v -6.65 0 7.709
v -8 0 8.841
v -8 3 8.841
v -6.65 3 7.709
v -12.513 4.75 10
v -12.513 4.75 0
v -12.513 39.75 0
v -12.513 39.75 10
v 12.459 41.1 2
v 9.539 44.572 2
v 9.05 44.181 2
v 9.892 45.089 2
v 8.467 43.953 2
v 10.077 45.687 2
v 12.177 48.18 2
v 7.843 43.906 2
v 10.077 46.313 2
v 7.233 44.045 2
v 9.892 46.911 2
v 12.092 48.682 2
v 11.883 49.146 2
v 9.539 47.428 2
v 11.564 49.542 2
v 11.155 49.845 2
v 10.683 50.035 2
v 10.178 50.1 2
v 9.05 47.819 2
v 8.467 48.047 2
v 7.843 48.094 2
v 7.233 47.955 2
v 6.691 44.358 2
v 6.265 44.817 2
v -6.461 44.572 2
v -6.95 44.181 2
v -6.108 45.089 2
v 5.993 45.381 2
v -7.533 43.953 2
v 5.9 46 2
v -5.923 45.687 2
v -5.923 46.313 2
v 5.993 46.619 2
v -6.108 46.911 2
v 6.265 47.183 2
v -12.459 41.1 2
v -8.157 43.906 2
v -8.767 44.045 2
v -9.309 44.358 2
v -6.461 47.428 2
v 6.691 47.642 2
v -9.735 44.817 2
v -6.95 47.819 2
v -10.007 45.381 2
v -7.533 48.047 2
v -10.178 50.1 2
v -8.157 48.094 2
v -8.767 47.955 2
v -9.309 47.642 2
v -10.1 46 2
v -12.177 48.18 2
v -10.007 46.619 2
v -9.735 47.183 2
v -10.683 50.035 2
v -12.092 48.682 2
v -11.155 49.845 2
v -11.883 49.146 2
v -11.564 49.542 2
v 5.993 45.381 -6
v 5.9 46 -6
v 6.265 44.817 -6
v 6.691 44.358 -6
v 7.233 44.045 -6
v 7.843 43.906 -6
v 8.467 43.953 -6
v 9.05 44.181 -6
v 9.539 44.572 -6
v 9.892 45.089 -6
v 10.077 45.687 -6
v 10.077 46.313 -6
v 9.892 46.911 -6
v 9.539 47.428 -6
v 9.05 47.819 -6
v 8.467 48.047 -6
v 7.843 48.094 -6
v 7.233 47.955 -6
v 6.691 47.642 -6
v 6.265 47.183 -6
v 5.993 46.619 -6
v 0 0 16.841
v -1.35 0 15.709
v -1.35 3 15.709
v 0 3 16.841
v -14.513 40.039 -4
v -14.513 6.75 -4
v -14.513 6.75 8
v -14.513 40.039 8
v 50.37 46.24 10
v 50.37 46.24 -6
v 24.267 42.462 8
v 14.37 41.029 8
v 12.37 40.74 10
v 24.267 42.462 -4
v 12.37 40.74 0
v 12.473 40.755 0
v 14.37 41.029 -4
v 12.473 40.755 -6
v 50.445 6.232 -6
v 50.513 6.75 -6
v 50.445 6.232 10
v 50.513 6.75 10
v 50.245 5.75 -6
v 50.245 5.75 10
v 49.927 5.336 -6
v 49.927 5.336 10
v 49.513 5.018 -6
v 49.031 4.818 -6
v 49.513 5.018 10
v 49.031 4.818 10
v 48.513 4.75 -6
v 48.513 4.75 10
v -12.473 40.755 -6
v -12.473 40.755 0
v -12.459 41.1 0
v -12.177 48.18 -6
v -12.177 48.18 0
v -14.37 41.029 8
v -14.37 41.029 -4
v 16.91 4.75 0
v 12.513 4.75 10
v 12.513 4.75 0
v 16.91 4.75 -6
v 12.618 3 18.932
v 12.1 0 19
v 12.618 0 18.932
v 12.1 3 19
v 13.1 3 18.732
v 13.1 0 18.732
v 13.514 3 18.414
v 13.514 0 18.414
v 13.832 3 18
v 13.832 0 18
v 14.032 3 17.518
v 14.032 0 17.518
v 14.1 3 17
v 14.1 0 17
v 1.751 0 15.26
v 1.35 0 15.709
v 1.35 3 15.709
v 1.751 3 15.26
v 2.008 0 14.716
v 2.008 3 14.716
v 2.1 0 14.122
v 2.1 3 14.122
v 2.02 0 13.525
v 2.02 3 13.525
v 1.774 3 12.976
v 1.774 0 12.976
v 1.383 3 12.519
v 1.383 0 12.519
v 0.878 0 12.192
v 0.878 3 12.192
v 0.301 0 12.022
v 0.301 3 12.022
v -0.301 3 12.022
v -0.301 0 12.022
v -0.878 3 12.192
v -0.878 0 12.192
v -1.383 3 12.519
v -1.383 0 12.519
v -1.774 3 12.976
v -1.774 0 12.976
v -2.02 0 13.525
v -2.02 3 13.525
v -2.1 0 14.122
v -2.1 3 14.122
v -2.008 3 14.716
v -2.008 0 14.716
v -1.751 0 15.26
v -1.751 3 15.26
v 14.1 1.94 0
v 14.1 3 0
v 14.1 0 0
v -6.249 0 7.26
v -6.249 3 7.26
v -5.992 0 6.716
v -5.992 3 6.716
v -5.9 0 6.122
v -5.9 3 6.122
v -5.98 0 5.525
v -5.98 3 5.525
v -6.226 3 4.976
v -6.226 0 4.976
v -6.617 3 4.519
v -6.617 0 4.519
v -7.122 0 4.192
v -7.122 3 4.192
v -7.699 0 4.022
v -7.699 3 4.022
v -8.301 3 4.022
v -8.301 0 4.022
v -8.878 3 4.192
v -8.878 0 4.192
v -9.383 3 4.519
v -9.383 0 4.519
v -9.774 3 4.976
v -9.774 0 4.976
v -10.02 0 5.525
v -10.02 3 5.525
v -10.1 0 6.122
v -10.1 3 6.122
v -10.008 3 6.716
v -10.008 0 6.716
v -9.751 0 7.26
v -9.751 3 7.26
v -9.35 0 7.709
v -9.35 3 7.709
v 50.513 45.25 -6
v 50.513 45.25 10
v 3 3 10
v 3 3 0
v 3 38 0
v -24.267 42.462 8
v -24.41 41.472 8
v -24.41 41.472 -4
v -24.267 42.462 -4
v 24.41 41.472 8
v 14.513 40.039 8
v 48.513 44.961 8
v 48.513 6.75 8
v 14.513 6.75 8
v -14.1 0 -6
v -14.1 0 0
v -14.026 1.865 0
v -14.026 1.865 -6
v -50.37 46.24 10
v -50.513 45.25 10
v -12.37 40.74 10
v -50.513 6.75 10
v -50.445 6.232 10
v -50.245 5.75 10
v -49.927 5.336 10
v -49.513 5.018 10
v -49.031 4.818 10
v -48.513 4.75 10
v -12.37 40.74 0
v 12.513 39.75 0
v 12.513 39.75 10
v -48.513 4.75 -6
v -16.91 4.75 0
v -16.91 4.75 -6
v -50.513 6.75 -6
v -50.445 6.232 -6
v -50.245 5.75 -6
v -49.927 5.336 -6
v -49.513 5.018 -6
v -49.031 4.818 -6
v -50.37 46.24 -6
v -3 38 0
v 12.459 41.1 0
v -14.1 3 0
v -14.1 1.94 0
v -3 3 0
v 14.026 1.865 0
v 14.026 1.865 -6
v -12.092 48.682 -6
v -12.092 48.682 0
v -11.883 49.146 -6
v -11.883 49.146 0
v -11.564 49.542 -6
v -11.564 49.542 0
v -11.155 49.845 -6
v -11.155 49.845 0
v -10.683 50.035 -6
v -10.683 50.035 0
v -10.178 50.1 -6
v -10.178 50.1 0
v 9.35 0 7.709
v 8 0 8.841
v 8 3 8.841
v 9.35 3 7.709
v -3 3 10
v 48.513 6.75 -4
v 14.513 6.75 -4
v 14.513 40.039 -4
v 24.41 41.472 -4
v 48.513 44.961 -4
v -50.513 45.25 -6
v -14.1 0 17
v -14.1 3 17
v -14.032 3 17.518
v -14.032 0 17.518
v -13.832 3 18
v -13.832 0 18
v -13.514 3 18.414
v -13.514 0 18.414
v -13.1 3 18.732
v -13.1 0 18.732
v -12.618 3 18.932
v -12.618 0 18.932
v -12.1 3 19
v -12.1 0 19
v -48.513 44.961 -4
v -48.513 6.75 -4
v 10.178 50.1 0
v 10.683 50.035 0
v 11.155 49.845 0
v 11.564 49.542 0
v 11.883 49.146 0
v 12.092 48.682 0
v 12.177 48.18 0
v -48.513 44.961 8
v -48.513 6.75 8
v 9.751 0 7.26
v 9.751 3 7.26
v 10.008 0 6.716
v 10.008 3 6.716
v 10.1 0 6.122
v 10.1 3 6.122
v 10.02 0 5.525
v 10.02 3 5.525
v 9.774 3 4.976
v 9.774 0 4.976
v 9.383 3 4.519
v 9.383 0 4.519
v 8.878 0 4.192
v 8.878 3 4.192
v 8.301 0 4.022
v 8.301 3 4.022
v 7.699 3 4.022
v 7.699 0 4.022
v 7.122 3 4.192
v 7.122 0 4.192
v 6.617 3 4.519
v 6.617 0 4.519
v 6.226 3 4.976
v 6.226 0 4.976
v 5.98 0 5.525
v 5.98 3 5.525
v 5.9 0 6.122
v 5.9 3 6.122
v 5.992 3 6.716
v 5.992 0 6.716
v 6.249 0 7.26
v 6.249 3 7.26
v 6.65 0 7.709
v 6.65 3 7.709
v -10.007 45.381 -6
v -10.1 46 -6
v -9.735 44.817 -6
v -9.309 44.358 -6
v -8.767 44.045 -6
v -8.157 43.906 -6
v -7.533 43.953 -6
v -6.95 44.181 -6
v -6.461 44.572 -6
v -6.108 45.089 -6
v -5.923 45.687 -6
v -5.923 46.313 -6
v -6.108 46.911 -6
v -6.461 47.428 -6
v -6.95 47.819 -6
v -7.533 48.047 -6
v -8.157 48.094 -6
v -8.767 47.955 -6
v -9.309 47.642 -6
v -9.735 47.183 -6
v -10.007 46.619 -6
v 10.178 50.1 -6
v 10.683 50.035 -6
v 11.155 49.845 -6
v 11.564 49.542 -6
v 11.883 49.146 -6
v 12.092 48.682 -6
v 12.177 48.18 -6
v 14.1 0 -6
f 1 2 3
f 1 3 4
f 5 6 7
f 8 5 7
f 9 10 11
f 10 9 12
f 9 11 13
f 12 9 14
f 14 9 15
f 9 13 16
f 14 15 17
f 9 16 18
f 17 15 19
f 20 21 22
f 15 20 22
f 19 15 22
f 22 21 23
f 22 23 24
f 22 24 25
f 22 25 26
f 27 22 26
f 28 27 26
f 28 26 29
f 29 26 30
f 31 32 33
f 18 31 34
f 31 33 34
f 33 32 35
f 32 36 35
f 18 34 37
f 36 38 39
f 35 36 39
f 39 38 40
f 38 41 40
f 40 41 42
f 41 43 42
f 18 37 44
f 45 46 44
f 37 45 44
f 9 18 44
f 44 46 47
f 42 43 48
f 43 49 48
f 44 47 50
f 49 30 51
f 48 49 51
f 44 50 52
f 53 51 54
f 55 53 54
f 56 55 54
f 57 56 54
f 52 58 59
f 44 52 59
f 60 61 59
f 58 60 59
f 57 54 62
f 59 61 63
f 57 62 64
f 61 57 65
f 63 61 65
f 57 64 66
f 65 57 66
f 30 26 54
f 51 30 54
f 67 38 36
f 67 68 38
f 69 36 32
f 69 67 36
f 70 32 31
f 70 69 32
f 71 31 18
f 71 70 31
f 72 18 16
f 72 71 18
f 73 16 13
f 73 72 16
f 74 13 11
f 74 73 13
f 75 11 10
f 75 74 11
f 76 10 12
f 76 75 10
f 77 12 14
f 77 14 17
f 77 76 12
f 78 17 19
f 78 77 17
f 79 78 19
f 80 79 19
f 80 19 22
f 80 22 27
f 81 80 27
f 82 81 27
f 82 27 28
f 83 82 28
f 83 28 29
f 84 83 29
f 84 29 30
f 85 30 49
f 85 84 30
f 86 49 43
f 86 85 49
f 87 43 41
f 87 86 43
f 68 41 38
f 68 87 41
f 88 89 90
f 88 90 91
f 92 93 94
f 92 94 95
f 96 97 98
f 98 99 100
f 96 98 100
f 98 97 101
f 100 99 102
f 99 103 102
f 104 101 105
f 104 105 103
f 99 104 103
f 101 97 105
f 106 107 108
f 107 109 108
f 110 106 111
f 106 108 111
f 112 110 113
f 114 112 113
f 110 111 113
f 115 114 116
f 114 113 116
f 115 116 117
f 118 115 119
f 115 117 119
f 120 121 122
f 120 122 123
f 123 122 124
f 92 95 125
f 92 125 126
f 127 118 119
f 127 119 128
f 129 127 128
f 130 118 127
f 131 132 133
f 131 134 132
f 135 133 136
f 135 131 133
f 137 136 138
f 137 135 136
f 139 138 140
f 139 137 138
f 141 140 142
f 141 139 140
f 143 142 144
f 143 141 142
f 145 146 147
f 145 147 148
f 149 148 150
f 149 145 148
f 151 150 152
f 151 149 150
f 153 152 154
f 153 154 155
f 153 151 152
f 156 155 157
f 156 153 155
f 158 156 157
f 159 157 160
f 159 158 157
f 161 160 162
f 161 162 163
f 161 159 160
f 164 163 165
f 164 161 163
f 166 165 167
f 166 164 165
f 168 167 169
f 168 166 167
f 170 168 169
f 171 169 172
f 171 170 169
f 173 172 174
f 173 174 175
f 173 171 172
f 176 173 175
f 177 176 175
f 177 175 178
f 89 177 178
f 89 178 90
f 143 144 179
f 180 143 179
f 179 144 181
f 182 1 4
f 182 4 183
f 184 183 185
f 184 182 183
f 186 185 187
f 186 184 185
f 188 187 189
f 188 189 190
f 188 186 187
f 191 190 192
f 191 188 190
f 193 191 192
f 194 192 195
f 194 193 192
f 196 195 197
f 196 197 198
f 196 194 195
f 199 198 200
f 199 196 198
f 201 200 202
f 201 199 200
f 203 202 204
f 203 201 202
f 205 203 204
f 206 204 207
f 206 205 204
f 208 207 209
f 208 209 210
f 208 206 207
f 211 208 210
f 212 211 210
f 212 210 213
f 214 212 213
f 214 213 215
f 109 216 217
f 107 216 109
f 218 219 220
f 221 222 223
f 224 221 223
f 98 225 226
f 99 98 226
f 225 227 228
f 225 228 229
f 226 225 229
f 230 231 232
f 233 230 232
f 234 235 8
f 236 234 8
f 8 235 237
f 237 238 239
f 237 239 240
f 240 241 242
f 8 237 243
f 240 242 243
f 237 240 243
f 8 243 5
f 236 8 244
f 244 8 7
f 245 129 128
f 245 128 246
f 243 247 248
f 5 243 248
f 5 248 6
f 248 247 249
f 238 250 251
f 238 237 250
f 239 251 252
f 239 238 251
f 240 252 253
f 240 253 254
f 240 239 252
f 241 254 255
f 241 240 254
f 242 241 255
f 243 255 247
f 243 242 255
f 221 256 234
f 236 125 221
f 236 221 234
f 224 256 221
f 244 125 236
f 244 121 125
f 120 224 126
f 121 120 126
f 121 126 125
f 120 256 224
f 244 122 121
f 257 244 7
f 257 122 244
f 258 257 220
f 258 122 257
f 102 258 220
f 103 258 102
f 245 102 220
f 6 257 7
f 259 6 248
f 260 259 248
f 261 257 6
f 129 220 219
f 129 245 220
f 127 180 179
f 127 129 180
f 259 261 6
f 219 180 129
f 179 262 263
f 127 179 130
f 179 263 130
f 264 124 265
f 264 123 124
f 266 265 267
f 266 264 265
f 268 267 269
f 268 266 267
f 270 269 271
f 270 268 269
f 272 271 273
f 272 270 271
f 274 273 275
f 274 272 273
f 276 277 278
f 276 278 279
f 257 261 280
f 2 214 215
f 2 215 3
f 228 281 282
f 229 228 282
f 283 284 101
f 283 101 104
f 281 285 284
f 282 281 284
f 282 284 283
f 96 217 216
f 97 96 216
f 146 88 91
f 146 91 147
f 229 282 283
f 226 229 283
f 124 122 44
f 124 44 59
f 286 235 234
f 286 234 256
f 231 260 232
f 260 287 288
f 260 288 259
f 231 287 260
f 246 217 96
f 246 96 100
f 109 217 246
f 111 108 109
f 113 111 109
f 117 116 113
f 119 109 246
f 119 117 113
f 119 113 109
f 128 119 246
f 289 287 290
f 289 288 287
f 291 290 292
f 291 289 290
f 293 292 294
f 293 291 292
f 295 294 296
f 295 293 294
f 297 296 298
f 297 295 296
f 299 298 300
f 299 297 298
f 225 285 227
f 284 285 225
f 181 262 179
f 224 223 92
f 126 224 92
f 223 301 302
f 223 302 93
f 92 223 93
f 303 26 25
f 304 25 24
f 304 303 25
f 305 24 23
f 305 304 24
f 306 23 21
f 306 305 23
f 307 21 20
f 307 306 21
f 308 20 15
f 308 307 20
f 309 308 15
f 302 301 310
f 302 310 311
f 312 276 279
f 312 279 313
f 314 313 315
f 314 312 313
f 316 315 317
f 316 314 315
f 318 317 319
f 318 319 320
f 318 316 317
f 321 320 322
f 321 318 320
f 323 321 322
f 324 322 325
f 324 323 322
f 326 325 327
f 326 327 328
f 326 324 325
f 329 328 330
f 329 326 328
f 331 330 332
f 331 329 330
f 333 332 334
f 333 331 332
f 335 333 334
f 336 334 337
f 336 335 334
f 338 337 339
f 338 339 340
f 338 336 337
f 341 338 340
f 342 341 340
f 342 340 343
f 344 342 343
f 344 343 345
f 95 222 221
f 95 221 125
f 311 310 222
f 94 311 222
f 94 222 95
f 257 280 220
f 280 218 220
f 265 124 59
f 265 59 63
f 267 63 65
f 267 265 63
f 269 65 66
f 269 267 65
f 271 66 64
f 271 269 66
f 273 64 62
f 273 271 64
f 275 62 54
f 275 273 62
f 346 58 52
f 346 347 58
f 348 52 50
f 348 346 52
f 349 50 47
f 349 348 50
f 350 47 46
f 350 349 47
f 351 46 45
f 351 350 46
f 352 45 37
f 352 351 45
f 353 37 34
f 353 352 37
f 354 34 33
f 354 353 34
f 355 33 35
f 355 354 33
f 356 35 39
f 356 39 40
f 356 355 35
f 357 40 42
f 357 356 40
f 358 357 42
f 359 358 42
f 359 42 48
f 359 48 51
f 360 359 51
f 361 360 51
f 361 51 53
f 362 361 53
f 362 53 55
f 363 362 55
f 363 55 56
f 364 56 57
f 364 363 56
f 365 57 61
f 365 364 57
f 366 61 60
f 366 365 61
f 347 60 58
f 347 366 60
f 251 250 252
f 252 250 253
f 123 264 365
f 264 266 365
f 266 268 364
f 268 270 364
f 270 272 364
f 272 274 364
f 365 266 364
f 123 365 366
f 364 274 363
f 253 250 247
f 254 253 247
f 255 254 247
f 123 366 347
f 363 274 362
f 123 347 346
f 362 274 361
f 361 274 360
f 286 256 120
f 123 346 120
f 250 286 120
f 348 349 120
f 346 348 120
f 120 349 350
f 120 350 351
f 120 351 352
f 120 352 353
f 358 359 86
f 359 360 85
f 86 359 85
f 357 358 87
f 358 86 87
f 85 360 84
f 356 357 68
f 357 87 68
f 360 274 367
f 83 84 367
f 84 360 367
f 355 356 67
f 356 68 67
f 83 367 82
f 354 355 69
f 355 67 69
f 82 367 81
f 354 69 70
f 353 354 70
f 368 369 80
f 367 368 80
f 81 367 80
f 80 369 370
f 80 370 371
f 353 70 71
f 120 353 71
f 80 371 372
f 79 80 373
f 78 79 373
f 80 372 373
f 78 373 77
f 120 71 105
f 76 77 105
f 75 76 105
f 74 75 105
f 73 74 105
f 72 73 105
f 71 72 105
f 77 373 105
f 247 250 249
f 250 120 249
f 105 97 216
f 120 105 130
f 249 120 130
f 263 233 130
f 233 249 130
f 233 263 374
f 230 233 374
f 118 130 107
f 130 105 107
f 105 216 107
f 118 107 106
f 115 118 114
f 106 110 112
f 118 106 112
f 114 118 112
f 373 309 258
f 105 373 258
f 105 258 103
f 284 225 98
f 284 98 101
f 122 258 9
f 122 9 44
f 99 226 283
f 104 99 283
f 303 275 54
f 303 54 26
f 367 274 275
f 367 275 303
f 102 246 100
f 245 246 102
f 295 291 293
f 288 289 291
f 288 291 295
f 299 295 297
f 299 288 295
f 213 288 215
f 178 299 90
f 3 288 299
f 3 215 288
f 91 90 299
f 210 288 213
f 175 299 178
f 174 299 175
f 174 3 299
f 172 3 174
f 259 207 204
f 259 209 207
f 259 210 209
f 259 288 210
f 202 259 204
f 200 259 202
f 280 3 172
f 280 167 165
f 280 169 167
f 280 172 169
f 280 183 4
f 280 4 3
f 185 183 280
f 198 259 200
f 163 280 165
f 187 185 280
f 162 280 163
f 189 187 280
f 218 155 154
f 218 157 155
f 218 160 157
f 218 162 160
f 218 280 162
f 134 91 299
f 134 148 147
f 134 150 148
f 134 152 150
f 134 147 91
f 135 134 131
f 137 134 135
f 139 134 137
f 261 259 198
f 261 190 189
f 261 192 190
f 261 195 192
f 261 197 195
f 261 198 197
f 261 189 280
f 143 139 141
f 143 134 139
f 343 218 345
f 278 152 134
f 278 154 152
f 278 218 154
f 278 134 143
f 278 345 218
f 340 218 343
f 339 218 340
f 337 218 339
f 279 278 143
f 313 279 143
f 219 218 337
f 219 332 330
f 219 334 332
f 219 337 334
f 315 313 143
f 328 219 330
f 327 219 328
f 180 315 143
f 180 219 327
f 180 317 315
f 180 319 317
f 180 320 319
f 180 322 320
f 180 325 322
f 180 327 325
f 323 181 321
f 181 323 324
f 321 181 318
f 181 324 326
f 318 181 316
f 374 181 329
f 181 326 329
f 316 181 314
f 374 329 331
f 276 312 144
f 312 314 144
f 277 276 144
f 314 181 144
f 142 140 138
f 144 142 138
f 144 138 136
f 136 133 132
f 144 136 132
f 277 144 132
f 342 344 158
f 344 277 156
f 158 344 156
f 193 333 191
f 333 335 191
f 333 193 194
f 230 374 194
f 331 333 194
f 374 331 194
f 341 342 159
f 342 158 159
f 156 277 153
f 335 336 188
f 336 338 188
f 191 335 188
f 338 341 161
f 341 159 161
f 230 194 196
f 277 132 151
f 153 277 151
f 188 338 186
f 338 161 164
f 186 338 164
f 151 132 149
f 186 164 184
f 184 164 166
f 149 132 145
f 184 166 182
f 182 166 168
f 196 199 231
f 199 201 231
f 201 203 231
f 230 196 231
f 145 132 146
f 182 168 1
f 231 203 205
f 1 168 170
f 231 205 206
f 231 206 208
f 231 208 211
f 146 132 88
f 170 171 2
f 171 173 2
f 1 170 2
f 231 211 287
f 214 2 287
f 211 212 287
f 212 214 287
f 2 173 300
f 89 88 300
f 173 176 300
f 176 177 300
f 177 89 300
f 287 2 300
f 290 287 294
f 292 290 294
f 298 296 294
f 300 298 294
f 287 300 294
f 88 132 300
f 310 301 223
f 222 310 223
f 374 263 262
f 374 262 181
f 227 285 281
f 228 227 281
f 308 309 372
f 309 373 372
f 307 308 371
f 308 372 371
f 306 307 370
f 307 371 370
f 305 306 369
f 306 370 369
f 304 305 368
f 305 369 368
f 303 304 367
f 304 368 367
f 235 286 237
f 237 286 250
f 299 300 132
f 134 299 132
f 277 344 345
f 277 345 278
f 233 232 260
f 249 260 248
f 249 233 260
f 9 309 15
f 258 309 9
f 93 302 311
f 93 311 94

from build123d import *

# Parameters (mm, degrees)
SKETCH1_W           = 28.2
SKETCH1_H           = 19
BOSS_EXTRUDE1_DEPTH = 3
SKETCH2_R           = 2.1
BOSS_EXTRUDE2_DEPTH = 6
BOSS_EXTRUDE3_DEPTH = 3
FILLET1_R           = 2
SKETCH4_R           = 2.1
BOSS_EXTRUDE4_DEPTH = 2
BOSS_EXTRUDE5_DEPTH = 16
FILLET2_R           = 2
SHELL1_START        = -4
SHELL1_DEPTH        = 12
SKETCH6_W           = 38.395963329
SKETCH6_H           = 16
SKETCH6_W_2         = 34.354282979
SKETCH6_H_2         = 12
SKETCH6_W_3         = 24.354282979
BOSS_EXTRUDE6_DEPTH = 1
CHAMFER1_SIZE       = 2.887134603
CHAMFER1_SIZE_2     = 3


with BuildPart() as part:
    # Sketch1 → Boss-Extrude1 (new body)
    with BuildSketch(Plane(origin=(0, 0, 0), x_dir=(1, 0, 0), z_dir=(0, 1, 0))):
        with Locations((0, -9.5)):
            Rectangle(SKETCH1_W, SKETCH1_H)
        with BuildLine():
            Line((-9.34985398, -7.708693331), (-8, -8.841355308))
            Line((-8, -8.841355308), (-6.65014602, -7.708693331))
            ThreePointArc((-6.65014602, -7.708693331), (-8, -4), (-9.34985398, -7.708693331))
        make_face(mode=Mode.SUBTRACT)
        with BuildLine():
            Line((-1.34985398, -15.708693331), (0, -16.841355308))
            Line((0, -16.841355308), (1.34985398, -15.708693331))
            ThreePointArc((1.34985398, -15.708693331), (0, -12), (-1.34985398, -15.708693331))
        make_face(mode=Mode.SUBTRACT)
        with BuildLine():
            Line((6.65014602, -7.708693331), (8, -8.841355308))
            Line((8, -8.841355308), (9.34985398, -7.708693331))
            ThreePointArc((9.34985398, -7.708693331), (8, -4), (6.65014602, -7.708693331))
        make_face(mode=Mode.SUBTRACT)
    extrude(amount=BOSS_EXTRUDE1_DEPTH)

    # Sketch2 → Boss-Extrude2 (add)
    with BuildSketch(Plane(origin=(0, 0, 0), x_dir=(-1, 0, 0), z_dir=(0, 0, -1))):
        Polygon((-14.1, 0), (14.1, 0), (12.1, 50.1), (-12.1, 50.1), align=None)
        with Locations((-8, 46)):
            Circle(SKETCH2_R, mode=Mode.SUBTRACT)
        with Locations((8, 46)):
            Circle(SKETCH2_R, mode=Mode.SUBTRACT)
    extrude(amount=BOSS_EXTRUDE2_DEPTH)

    # Sketch3 → Boss-Extrude3 (add, symmetric)
    with BuildSketch(Plane(origin=(0, 0, 0), x_dir=(0, 0, -1), z_dir=(1, 0, 0))):
        Polygon((0, 3), (-10, 3), (0, 38), align=None)
    extrude(amount=BOSS_EXTRUDE3_DEPTH, both=True)

    # Fillet1
    fillet1_edges = [part.edges().sort_by_distance(p)[0] for p in [
        (12.1, 50.1, -3),
        (-12.1, 50.1, -3),
        (14.1, 1.5, 19),
        (-14.1, 1.5, 19),
    ]]
    fillet(fillet1_edges, radius=FILLET1_R)

    # Sketch4 → Boss-Extrude4 (add)
    with BuildSketch(Plane.XY):
        with BuildLine():
            Line((-10.178247335, 50.1), (10.178247335, 50.1))
            ThreePointArc((10.178247335, 50.1), (11.563968527, 49.54214312), (12.176655618, 48.179776778))
            Line((12.176655618, 48.179776778), (12.459281437, 41.1))
            Line((12.459281437, 41.1), (-12.459281437, 41.1))
            Line((-12.459281437, 41.1), (-12.176655618, 48.179776778))
            ThreePointArc((-12.176655618, 48.179776778), (-11.563968527, 49.54214312), (-10.178247335, 50.1))
        make_face()
        with Locations(Location((-8, 46, 0), (0, 0, 180))):
            Circle(SKETCH4_R, mode=Mode.SUBTRACT)
        with Locations(Location((8, 46, 0), (0, 0, 180))):
            Circle(SKETCH4_R, mode=Mode.SUBTRACT)
    extrude(amount=BOSS_EXTRUDE4_DEPTH)


with BuildPart() as body_2:
    # Sketch5 → Boss-Extrude5 (new body)
    with BuildSketch(Plane(origin=(0, 0, -6), x_dir=(-1, 0, 0), z_dir=(0, 0, -1))):
        Polygon((12.513173653, 39.75), (50.513173653, 45.25), (50.513173653, 4.75), (12.513173653, 4.75), align=None)
    extrude(amount=-BOSS_EXTRUDE5_DEPTH)

    # Fillet2
    fillet2_edges = [body_2.edges().sort_by_distance(p)[0] for p in [
        (-50.513173653, 4.75, 2),
    ]]
    fillet(fillet2_edges, radius=FILLET2_R)

    # Shell1: read off the stored shape, not the designer's step
    # Shell1 outline → Shell1 (cut)
    with BuildSketch(Plane.XY.offset(SHELL1_START)):
        Polygon((-48.513173653, 44.960526316), (-48.513173653, 6.75), (-14.513173653, 6.75), (-14.513173653, 40.039473684), align=None)
    extrude(amount=SHELL1_DEPTH, mode=Mode.SUBTRACT)

    # Sketch6 → Boss-Extrude6 (add)
    # profile 1 of 2: a face of its own
    with BuildSketch(Plane(origin=(5.378481599, 37.160418319, 0), x_dir=(0.9896873708806833, -0.14324422473273113, 0), z_dir=(0.14324422473273113, 0.9896873708806833, 0))):
        with Locations((-37.276069531, -2)):
            Rectangle(SKETCH6_W, SKETCH6_H)
        with Locations((-37.276069531, -2)):
            Rectangle(SKETCH6_W_2, SKETCH6_H_2, mode=Mode.SUBTRACT)
    # profile 2 of 2: a face of its own
    with BuildSketch(Plane(origin=(5.378481599, 37.160418319, 0), x_dir=(0.9896873708806833, -0.14324422473273113, 0), z_dir=(0.14324422473273113, 0.9896873708806833, 0))):
        with Locations((-42.276069531, -2)):
            Rectangle(SKETCH6_W_3, SKETCH6_H_2)
    extrude(amount=BOSS_EXTRUDE6_DEPTH)


with BuildPart() as body_3:
    # Mirror2: mirrored copy
    add(body_2.part.mirror(Plane(origin=(0, 0, 0), x_dir=(0, 0, 1), z_dir=(1, 0, 0))))


with BuildPart() as part_1:
    add(part.part)

    # Combine1: read off the stored shape, not the designer's step
    # Combine1: union body 3, body 2
    add(body_3.part)
    add(body_2.part)

    # Chamfer1
    # the kernel refuses this chamfer: 3, 2.887134603 mm, written as the material it adds along each edge
    with BuildSketch(Plane(origin=(-13.910379242, 4.75, -6), x_dir=(-0.039888388883066415, -0.9992041415207972, 0), z_dir=(0, 0, 1))) as chamfer1_piece_1:
        Polygon((CHAMFER1_SIZE, 0), (CHAMFER1_SIZE_2 * 0.0398883888831, -CHAMFER1_SIZE_2 * 0.999204141521), (0, 0), align=None)
    extrude(amount=6)
    with BuildSketch(Plane(origin=(13.910379242, 4.75, -6), x_dir=(0.039888388883066304, -0.9992041415207972, 0), z_dir=(0, 0, 1))) as chamfer1_piece_2:
        Polygon((CHAMFER1_SIZE, 0), (CHAMFER1_SIZE_2 * 0.0398883888831, CHAMFER1_SIZE_2 * 0.999204141521), (0, 0), align=None)
    extrude(amount=6)


solid = part_1.part
